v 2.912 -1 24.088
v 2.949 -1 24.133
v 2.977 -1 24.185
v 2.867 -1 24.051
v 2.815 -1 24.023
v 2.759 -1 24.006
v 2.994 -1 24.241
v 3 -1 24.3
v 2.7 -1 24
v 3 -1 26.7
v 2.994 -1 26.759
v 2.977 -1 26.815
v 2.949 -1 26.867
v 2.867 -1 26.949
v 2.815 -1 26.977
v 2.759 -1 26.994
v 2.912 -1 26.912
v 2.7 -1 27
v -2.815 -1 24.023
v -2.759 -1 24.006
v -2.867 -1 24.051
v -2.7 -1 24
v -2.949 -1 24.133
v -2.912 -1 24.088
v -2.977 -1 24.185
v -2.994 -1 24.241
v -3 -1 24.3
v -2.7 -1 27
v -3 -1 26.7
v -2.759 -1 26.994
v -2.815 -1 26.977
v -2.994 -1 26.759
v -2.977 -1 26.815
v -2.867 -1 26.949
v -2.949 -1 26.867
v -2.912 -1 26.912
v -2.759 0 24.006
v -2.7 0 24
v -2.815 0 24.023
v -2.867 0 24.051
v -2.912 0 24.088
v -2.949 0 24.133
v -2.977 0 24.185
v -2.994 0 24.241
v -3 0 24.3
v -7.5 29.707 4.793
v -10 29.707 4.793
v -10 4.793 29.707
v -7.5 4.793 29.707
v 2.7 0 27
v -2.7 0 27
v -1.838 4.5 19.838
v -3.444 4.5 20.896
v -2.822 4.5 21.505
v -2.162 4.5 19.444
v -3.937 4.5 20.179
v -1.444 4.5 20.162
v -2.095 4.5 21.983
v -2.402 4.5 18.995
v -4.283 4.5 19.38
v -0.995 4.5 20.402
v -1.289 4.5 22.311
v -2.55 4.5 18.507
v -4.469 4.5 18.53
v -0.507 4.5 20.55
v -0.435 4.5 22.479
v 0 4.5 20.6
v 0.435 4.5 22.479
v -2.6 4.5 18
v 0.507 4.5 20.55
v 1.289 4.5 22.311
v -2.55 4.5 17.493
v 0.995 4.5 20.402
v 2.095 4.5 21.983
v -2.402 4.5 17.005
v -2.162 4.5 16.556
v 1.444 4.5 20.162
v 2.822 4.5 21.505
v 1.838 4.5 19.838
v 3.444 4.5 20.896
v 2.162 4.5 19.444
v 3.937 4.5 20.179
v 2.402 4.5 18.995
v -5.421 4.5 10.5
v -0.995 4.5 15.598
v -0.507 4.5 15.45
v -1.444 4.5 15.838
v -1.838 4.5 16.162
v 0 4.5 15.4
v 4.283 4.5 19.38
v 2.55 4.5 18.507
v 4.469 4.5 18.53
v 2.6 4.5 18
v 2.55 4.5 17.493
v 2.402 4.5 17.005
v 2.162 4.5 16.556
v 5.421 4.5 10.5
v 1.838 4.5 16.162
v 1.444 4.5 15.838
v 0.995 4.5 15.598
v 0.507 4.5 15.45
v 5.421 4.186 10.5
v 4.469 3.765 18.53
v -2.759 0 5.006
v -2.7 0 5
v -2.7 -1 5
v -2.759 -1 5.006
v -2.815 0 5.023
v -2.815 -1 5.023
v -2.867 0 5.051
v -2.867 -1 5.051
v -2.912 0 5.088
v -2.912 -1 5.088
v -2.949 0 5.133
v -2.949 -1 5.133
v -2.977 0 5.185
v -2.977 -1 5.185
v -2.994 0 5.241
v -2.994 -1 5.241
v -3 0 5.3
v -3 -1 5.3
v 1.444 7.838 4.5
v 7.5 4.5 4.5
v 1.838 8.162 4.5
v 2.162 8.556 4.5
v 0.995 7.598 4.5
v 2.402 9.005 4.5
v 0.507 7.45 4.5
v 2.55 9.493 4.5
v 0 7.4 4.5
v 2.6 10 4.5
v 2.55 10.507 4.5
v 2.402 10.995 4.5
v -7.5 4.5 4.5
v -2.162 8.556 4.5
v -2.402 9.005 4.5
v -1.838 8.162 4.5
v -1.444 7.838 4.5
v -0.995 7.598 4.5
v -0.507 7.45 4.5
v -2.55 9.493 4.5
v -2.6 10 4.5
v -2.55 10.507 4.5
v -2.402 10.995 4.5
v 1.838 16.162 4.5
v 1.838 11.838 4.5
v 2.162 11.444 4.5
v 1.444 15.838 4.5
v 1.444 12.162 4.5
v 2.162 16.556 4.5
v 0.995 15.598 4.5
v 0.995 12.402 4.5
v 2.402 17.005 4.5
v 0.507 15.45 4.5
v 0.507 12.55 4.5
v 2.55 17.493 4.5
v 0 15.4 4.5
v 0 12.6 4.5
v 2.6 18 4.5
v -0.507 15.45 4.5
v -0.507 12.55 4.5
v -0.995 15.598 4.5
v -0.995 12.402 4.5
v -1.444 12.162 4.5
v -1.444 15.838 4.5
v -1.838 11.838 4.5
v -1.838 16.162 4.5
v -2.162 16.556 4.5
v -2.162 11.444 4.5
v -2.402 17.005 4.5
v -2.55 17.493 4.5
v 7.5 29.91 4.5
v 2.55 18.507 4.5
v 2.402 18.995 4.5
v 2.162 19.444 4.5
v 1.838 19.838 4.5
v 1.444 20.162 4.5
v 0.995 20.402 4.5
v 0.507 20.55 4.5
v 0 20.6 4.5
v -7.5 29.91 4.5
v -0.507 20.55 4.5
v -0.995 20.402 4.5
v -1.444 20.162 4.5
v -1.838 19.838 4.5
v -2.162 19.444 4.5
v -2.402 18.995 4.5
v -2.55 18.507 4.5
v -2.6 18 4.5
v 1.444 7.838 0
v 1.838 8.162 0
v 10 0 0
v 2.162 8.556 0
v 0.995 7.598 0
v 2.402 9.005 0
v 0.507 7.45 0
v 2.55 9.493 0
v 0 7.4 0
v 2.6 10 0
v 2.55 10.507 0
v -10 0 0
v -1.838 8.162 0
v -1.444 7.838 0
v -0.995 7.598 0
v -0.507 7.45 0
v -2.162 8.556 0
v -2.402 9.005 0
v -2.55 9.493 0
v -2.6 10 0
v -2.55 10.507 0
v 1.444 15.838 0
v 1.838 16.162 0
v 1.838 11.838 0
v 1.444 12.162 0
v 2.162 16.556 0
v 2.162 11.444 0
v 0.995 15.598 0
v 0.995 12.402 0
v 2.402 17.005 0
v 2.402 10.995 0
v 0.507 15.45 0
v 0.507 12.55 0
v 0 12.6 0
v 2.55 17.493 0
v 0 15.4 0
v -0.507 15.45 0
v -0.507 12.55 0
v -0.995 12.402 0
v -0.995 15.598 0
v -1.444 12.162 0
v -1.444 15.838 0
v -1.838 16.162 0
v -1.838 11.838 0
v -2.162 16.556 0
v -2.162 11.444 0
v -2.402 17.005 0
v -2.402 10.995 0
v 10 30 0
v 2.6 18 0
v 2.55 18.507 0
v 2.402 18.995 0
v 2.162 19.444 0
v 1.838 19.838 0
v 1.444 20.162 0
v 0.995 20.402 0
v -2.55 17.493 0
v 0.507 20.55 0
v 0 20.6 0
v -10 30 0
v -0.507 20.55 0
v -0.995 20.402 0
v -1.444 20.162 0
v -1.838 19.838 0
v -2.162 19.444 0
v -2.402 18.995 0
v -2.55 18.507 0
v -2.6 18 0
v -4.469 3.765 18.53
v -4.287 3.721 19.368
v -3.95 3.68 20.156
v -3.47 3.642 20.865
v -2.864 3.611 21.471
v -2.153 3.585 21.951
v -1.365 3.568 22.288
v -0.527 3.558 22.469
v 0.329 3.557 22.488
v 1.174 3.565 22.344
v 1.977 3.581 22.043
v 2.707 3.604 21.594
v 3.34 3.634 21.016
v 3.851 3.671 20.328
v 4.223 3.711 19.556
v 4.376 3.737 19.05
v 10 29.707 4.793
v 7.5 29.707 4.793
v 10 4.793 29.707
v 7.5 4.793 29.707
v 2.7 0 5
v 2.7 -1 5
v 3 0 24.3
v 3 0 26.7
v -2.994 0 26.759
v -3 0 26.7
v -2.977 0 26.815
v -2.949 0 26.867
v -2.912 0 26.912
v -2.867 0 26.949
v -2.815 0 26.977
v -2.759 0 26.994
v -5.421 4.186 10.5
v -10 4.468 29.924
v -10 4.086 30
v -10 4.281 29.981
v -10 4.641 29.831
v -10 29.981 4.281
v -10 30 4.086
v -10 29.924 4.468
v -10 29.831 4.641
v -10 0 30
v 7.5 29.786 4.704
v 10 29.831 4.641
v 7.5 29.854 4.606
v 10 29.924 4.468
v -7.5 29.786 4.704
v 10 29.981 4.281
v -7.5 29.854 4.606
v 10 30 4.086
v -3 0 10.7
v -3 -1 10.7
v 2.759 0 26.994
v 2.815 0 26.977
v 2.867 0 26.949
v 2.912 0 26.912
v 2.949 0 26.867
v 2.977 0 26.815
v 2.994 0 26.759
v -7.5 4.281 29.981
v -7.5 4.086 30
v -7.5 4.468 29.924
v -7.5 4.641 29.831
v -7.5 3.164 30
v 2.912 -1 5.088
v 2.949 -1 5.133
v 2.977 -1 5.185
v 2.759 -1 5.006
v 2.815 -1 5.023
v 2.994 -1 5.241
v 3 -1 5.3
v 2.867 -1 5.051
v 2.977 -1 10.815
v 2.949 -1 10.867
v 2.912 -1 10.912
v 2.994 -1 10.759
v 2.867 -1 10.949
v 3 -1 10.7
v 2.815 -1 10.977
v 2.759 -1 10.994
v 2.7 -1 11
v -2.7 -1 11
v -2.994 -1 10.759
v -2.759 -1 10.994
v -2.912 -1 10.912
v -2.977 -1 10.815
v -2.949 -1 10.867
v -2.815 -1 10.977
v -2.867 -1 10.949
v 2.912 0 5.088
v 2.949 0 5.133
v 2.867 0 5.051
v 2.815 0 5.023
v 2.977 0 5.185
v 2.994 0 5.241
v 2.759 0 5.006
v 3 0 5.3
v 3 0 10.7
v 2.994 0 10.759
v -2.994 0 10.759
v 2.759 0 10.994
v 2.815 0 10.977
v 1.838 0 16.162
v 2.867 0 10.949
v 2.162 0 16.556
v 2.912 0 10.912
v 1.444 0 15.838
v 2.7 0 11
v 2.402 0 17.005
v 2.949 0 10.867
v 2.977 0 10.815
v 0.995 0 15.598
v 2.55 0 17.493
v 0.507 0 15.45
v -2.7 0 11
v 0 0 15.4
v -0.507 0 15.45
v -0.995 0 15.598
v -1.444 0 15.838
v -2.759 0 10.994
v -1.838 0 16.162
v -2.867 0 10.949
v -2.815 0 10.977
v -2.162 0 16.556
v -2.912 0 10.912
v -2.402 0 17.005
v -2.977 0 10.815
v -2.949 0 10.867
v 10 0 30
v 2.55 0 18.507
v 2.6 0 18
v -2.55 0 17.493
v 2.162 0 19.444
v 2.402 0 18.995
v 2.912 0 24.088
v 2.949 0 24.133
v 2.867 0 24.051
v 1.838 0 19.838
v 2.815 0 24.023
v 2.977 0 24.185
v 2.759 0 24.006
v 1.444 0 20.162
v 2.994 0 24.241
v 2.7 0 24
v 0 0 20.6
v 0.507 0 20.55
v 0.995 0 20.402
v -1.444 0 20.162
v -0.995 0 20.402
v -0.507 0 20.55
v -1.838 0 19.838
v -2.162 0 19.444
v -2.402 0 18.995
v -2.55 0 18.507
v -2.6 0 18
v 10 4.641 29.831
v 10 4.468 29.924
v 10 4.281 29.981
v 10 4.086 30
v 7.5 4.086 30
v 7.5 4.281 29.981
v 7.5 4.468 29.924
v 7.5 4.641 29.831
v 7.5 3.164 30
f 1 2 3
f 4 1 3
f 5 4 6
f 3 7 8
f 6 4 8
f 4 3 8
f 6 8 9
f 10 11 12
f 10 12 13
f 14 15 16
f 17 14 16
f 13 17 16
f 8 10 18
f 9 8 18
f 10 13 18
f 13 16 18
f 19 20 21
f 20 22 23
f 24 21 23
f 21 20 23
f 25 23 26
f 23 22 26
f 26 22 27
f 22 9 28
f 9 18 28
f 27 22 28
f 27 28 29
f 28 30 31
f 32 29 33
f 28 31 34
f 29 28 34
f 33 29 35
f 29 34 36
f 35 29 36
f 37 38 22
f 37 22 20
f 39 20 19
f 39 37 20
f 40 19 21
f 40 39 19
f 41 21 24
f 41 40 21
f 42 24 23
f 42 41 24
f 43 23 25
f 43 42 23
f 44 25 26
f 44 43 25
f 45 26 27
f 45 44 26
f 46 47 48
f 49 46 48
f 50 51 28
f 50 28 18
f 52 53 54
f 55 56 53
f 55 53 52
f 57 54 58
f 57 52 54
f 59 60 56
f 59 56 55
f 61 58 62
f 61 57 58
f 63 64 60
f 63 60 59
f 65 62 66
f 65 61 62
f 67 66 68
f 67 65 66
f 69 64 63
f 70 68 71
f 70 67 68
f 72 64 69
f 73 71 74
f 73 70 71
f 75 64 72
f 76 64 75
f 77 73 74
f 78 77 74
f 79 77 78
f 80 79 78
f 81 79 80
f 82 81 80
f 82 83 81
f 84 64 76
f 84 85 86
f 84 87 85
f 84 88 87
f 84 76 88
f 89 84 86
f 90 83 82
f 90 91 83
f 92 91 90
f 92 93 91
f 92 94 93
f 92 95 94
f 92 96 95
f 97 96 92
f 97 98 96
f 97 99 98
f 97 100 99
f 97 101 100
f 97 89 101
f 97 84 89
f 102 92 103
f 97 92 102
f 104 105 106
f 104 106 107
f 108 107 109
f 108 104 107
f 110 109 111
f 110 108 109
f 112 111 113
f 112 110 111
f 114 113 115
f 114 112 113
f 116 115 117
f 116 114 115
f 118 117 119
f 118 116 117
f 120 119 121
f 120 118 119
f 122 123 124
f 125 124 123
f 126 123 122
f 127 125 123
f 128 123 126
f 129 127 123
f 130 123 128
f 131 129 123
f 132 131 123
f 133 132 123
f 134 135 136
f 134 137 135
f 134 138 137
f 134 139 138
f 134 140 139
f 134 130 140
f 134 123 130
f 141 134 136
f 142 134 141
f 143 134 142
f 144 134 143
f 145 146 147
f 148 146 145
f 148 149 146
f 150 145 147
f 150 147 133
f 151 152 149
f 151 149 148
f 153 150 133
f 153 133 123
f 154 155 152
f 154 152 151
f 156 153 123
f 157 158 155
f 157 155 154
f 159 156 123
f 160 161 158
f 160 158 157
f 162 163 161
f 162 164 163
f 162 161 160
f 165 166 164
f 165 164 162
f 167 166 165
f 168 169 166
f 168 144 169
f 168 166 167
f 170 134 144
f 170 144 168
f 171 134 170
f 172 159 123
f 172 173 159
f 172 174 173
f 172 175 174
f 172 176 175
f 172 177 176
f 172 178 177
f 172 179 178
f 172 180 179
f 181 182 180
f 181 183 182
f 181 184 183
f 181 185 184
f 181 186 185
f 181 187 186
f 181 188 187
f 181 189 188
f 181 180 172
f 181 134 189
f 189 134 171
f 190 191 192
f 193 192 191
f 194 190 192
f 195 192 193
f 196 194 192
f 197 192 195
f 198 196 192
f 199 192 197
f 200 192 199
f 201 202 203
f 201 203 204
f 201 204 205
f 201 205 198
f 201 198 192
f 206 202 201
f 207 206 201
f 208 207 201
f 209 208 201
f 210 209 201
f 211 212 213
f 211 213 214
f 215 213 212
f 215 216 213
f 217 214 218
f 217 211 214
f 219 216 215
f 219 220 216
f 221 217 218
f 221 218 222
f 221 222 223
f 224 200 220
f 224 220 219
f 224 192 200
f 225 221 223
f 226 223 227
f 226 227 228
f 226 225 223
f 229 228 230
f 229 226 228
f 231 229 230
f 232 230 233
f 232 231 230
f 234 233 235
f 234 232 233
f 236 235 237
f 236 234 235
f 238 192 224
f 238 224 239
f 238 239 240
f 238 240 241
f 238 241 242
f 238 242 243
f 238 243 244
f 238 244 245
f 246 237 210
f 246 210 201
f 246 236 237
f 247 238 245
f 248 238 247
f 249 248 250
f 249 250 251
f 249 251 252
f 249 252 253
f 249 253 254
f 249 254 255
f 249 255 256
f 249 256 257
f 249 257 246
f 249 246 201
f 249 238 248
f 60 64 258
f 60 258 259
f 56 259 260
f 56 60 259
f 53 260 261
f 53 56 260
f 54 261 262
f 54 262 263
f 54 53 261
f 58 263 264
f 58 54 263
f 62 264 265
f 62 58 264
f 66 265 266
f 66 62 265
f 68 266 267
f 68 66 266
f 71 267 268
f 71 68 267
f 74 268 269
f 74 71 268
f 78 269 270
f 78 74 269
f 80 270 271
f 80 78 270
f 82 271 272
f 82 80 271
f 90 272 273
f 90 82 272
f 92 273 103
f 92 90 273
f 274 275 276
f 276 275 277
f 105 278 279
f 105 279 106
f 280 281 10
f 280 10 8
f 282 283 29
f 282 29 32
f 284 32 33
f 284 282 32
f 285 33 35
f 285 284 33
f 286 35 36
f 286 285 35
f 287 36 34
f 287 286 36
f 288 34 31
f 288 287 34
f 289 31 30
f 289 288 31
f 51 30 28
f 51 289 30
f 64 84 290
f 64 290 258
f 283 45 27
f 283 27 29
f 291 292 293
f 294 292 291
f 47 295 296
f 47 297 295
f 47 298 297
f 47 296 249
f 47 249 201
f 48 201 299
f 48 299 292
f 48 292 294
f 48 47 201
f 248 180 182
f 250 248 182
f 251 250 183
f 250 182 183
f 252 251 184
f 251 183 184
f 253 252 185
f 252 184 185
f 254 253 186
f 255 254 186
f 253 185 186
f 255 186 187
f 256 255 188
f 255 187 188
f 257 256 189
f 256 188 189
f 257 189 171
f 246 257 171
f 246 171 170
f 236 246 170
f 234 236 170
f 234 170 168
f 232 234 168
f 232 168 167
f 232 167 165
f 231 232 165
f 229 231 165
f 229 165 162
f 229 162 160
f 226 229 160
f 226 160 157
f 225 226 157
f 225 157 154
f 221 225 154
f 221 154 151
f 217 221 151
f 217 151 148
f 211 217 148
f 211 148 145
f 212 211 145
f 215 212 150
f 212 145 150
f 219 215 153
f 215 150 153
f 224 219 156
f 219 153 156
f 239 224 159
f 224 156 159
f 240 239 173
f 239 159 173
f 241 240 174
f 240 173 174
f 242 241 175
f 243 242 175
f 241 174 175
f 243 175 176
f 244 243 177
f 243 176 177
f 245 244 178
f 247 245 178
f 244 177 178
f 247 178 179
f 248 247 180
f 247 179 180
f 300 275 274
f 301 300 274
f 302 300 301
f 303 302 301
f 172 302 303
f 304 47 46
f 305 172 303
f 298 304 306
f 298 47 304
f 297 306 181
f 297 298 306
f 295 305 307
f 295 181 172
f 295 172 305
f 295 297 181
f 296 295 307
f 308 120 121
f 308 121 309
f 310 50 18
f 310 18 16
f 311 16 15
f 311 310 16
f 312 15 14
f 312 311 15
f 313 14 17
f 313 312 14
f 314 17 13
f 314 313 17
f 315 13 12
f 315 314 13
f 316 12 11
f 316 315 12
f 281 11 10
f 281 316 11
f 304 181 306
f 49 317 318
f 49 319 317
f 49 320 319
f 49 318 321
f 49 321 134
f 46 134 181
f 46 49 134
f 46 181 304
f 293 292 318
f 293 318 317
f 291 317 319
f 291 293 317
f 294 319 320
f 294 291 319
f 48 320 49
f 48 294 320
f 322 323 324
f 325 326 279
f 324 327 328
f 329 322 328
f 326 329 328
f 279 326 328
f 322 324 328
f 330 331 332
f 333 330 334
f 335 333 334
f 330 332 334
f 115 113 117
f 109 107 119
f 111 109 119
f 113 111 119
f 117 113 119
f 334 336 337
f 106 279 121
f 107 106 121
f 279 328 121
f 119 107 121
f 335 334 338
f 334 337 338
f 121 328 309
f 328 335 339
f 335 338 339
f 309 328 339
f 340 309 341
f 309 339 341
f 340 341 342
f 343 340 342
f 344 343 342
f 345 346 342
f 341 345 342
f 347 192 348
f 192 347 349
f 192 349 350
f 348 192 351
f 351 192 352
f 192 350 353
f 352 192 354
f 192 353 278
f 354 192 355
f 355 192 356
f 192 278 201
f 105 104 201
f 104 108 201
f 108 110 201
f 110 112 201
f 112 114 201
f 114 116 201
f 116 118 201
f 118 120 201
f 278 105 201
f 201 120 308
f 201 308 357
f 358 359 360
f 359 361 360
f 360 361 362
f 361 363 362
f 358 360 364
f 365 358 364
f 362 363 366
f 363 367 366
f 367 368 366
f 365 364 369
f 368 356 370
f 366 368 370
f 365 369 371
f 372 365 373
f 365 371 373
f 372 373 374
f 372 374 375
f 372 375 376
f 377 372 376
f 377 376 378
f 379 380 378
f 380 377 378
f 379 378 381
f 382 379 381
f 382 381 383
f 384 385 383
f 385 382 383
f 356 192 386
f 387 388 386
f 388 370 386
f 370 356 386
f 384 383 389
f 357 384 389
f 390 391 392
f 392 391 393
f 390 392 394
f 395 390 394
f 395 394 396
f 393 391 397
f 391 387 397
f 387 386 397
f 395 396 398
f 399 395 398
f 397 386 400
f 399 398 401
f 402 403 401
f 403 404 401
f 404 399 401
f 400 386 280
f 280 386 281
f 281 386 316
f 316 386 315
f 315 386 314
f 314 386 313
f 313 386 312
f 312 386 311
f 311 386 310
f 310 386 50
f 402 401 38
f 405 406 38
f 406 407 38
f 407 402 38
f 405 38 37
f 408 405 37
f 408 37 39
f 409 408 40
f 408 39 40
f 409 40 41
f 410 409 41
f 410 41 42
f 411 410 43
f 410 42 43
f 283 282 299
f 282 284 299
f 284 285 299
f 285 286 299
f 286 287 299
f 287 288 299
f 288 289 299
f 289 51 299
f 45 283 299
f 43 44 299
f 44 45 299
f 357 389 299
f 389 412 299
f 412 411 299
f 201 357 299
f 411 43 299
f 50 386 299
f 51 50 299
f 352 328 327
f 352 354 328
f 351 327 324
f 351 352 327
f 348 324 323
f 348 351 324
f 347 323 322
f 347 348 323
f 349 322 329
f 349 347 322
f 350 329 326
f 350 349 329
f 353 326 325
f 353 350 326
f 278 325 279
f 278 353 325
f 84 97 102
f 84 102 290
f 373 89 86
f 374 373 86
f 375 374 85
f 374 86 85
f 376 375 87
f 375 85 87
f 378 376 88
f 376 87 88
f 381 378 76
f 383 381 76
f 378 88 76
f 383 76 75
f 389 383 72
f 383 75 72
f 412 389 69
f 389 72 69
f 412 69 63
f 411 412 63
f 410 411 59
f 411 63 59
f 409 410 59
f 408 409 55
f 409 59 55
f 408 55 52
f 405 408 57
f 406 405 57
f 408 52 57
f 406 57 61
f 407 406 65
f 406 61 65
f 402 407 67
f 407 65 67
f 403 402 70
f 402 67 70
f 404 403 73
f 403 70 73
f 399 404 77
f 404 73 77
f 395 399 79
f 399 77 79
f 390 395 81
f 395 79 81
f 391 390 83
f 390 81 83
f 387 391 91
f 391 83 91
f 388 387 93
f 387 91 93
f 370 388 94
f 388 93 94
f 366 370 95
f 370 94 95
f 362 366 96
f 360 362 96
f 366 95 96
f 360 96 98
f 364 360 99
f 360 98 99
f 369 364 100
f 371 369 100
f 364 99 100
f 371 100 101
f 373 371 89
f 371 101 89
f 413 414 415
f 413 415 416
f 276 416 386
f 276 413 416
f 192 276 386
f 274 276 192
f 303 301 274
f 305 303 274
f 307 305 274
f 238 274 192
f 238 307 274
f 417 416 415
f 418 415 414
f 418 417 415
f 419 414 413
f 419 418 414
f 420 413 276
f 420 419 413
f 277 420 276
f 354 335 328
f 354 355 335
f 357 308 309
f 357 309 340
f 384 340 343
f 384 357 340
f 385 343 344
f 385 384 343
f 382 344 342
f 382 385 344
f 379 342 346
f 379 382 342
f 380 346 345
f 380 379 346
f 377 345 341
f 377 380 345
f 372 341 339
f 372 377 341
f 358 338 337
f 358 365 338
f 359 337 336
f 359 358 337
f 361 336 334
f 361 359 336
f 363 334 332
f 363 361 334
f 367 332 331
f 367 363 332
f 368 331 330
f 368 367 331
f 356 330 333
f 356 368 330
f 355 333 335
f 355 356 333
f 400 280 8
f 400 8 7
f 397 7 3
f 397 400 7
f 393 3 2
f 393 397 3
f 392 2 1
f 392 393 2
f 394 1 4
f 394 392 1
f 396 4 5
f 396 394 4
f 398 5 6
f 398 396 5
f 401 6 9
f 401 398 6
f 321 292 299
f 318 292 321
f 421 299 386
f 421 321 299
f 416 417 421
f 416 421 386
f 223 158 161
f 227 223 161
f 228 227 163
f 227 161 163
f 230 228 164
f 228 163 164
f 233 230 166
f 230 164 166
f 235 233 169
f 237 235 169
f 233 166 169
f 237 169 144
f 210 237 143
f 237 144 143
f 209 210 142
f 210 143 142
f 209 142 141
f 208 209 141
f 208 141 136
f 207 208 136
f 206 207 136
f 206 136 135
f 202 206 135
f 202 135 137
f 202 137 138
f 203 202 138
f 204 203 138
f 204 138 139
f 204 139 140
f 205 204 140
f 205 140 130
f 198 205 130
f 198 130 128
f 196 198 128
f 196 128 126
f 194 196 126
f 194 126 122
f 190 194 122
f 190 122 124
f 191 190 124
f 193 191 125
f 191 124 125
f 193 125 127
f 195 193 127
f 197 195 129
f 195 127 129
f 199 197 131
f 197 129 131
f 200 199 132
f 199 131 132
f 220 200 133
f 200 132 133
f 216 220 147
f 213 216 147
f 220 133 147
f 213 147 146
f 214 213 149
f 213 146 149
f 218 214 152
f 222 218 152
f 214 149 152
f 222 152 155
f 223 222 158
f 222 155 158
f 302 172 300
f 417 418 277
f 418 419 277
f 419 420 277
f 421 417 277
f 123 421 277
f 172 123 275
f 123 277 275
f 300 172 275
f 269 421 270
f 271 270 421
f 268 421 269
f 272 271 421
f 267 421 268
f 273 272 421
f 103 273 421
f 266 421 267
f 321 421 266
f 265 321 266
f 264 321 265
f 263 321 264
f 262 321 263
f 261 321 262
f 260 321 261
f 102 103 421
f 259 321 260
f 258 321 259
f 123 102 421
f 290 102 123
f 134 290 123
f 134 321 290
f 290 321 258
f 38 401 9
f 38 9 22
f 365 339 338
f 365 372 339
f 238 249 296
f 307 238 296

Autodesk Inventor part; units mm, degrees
sketch "Sketch_15" plane through (0, 0, 0) normal (1, 0, 0) x (0, 1, 0)
  line L0 (0, 30) -> (0, 0)
  line L1 (0, 0) -> (30, 0)
  line L2 (30, 0) -> (30, 4.0858)
  arc A0 (30, 4.0858) -> (29.7071, 4.7929) centre (29, 4.0858) ccw
  line L3 (29.7071, 4.7929) -> (4.7929, 29.7071)
  arc A1 (4.7929, 29.7071) -> (4.0858, 30) centre (4.0858, 29) ccw
  line L4 (4.0858, 30) -> (0, 30)
extrude "Extrusion1" add sketch "Sketch_15" along normal mid plane 20
sketch "Sketch_16" plane through (0, 0, 0) normal (1, 0, 0) x (0, 1, 0)
  line L0 (2.9278, 34.5) -> (4.5, 4.5)
  line L1 (4.5, 4.5) -> (34.5, 4.5)
  line L2 (34.5, 4.5) -> (34.5, 34.5)
  line L3 (34.5, 34.5) -> (2.9278, 34.5)
extrude "Extrusion2" cut sketch "Sketch_16" along normal mid plane 15
sketch "Sketch_17" plane through (0, 4.5, 0) normal (0, 1, 0) x (1, 0, 0)
  line L0 (-5.4209, -10.5) -> (-4.4687, -18.5299)
  arc A0 (-4.4687, -18.5299) -> (4.4687, -18.5299) centre (0, -18) ccw
  line L1 (4.4687, -18.5299) -> (5.4209, -10.5)
  line L2 (5.4209, -10.5) -> (-5.4209, -10.5)
extrude "Extrusion3" add sketch "Sketch_17" against normal blind 2.25
sketch "Sketch4" plane through (10, 0, 0) normal (0, 0, -1) x (-1, 0, 0)
  point P0 (10, 18)
hole "Hole1" at (0, 18, 0) direction (0, 0, 1) diameter 5.2 depth 4.5
sketch "Sketch5" plane through (10, 0, 0) normal (0, 0, -1) x (-1, 0, 0)
  point P0 (10, 10)
hole "Hole2" at (0, 10, 0) direction (0, 0, 1) diameter 5.2 depth 4.5
sketch "Sketch6" plane through (-10, 0, 30) normal (0, -1, 0) x (1, 0, 0)
  point P0 (10, -12)
hole "Hole3" at (0, 0, 18) direction (0, 1, 0) diameter 5.2 depth 4.5
sketch "Sketch_1" plane through (0, 0, 0) normal (0, 1, 0) x (-1, 0, 0)
  line L0 (10, 0) -> (10, 30)
  line L1 (10, 30) -> (-10, 30)
  line L2 (-10, 30) -> (-10, 0)
  line L3 (-10, 0) -> (10, 0)
extrude "Extrusion4" add sketch "Sketch_1" against normal blind 1
sketch "Sketch_4" plane through (0, 0, 0) normal (0, 1, 0) x (-1, 0, 0)
  line L0 (10, 0) -> (10, 30)
  line L1 (10, 30) -> (-10, 30)
  line L2 (-10, 30) -> (-10, 0)
  line L3 (-10, 0) -> (10, 0)
  arc A0 (3, 10.7) -> (2.7, 11) centre (2.7, 10.7) ccw
  line L4 (2.7, 11) -> (-2.7, 11)
  arc A1 (-2.7, 11) -> (-3, 10.7) centre (-2.7, 10.7) ccw
  line L5 (-3, 10.7) -> (-3, 5.3)
  arc A2 (-3, 5.3) -> (-2.7, 5) centre (-2.7, 5.3) ccw
  line L6 (-2.7, 5) -> (2.7, 5)
  arc A3 (2.7, 5) -> (3, 5.3) centre (2.7, 5.3) ccw
  line L7 (3, 5.3) -> (3, 10.7)
  arc A4 (3, 26.7) -> (2.7, 27) centre (2.7, 26.7) ccw
  line L8 (2.7, 27) -> (-2.7, 27)
  arc A5 (-2.7, 27) -> (-3, 26.7) centre (-2.7, 26.7) ccw
  line L9 (-3, 26.7) -> (-3, 24.3)
  arc A6 (-3, 24.3) -> (-2.7, 24) centre (-2.7, 24.3) ccw
  line L10 (-2.7, 24) -> (2.7, 24)
  arc A7 (2.7, 24) -> (3, 24.3) centre (2.7, 24.3) ccw
  line L11 (3, 24.3) -> (3, 26.7)
extrude "Extrusion5" cut sketch "Sketch_4" against normal blind 1
ref_plane "bracket_to_bolt_XY" through (1, 10, 0) normal (0, 0, 1) x (1, 0, 0)
ref_plane "bracket_to_bolt_YZ" through (1, 10, 0) normal (1, 0, 0) x (0, 1, 0)
ref_plane "bracket_to_bolt_ZX" through (1, 10, 0) normal (0, 1, 0) x (0, 0, 1)
ref_plane "bracket_to_dummy_XY" through (0, 0, 0) normal (0, 1, 0) x (1, 0, 0)
ref_plane "bracket_to_dummy_YZ" through (0, 0, 0) normal (1, 0, 0) x (0, 0, -1)
ref_plane "bracket_to_dummy_ZX" through (0, 0, 0) normal (0, 0, -1) x (0, 1, 0)
ref_plane "to_bolt_4_7_base_XY" through (0, 4.5, 18) normal (0, 1, 0) x (1, 0, 0)
ref_plane "to_bolt_4_7_base_YZ" through (0, 4.5, 18) normal (1, 0, 0) x (0, 0, -1)
ref_plane "to_bolt_4_7_base_ZX" through (0, 4.5, 18) normal (0, 0, -1) x (0, 1, 0)
ref_plane "to_bolt_row_4_to_7_XY" through (0, 18, 4.5) normal (0, 0, 1) x (1, 0, 0)
ref_plane "to_bolt_row_4_to_7_YZ" through (0, 18, 4.5) normal (1, 0, 0) x (0, 1, 0)
ref_plane "to_bolt_row_4_to_7_ZX" through (0, 18, 4.5) normal (0, 1, 0) x (0, 0, 1)
ref_plane "to_nut_base_4_7_XY" through (0, -2, 18) normal (0, 1, 0) x (1, 0, 0)
ref_plane "to_nut_base_4_7_YZ" through (0, -2, 18) normal (1, 0, 0) x (0, 0, -1)
ref_plane "to_nut_base_4_7_ZX" through (0, -2, 18) normal (0, 0, -1) x (0, 1, 0)
ref_plane "to_nut_row_4_to_7_XY" through (0, 18, -2) normal (0, 0, 1) x (1, 0, 0)
ref_plane "to_nut_row_4_to_7_YZ" through (0, 18, -2) normal (1, 0, 0) x (0, 1, 0)
ref_plane "to_nut_row_4_to_7_ZX" through (0, 18, -2) normal (0, 1, 0) x (0, 0, 1)
properties part number "HBLFSNK5hblfsn5" material "アルミニウム 6061"
